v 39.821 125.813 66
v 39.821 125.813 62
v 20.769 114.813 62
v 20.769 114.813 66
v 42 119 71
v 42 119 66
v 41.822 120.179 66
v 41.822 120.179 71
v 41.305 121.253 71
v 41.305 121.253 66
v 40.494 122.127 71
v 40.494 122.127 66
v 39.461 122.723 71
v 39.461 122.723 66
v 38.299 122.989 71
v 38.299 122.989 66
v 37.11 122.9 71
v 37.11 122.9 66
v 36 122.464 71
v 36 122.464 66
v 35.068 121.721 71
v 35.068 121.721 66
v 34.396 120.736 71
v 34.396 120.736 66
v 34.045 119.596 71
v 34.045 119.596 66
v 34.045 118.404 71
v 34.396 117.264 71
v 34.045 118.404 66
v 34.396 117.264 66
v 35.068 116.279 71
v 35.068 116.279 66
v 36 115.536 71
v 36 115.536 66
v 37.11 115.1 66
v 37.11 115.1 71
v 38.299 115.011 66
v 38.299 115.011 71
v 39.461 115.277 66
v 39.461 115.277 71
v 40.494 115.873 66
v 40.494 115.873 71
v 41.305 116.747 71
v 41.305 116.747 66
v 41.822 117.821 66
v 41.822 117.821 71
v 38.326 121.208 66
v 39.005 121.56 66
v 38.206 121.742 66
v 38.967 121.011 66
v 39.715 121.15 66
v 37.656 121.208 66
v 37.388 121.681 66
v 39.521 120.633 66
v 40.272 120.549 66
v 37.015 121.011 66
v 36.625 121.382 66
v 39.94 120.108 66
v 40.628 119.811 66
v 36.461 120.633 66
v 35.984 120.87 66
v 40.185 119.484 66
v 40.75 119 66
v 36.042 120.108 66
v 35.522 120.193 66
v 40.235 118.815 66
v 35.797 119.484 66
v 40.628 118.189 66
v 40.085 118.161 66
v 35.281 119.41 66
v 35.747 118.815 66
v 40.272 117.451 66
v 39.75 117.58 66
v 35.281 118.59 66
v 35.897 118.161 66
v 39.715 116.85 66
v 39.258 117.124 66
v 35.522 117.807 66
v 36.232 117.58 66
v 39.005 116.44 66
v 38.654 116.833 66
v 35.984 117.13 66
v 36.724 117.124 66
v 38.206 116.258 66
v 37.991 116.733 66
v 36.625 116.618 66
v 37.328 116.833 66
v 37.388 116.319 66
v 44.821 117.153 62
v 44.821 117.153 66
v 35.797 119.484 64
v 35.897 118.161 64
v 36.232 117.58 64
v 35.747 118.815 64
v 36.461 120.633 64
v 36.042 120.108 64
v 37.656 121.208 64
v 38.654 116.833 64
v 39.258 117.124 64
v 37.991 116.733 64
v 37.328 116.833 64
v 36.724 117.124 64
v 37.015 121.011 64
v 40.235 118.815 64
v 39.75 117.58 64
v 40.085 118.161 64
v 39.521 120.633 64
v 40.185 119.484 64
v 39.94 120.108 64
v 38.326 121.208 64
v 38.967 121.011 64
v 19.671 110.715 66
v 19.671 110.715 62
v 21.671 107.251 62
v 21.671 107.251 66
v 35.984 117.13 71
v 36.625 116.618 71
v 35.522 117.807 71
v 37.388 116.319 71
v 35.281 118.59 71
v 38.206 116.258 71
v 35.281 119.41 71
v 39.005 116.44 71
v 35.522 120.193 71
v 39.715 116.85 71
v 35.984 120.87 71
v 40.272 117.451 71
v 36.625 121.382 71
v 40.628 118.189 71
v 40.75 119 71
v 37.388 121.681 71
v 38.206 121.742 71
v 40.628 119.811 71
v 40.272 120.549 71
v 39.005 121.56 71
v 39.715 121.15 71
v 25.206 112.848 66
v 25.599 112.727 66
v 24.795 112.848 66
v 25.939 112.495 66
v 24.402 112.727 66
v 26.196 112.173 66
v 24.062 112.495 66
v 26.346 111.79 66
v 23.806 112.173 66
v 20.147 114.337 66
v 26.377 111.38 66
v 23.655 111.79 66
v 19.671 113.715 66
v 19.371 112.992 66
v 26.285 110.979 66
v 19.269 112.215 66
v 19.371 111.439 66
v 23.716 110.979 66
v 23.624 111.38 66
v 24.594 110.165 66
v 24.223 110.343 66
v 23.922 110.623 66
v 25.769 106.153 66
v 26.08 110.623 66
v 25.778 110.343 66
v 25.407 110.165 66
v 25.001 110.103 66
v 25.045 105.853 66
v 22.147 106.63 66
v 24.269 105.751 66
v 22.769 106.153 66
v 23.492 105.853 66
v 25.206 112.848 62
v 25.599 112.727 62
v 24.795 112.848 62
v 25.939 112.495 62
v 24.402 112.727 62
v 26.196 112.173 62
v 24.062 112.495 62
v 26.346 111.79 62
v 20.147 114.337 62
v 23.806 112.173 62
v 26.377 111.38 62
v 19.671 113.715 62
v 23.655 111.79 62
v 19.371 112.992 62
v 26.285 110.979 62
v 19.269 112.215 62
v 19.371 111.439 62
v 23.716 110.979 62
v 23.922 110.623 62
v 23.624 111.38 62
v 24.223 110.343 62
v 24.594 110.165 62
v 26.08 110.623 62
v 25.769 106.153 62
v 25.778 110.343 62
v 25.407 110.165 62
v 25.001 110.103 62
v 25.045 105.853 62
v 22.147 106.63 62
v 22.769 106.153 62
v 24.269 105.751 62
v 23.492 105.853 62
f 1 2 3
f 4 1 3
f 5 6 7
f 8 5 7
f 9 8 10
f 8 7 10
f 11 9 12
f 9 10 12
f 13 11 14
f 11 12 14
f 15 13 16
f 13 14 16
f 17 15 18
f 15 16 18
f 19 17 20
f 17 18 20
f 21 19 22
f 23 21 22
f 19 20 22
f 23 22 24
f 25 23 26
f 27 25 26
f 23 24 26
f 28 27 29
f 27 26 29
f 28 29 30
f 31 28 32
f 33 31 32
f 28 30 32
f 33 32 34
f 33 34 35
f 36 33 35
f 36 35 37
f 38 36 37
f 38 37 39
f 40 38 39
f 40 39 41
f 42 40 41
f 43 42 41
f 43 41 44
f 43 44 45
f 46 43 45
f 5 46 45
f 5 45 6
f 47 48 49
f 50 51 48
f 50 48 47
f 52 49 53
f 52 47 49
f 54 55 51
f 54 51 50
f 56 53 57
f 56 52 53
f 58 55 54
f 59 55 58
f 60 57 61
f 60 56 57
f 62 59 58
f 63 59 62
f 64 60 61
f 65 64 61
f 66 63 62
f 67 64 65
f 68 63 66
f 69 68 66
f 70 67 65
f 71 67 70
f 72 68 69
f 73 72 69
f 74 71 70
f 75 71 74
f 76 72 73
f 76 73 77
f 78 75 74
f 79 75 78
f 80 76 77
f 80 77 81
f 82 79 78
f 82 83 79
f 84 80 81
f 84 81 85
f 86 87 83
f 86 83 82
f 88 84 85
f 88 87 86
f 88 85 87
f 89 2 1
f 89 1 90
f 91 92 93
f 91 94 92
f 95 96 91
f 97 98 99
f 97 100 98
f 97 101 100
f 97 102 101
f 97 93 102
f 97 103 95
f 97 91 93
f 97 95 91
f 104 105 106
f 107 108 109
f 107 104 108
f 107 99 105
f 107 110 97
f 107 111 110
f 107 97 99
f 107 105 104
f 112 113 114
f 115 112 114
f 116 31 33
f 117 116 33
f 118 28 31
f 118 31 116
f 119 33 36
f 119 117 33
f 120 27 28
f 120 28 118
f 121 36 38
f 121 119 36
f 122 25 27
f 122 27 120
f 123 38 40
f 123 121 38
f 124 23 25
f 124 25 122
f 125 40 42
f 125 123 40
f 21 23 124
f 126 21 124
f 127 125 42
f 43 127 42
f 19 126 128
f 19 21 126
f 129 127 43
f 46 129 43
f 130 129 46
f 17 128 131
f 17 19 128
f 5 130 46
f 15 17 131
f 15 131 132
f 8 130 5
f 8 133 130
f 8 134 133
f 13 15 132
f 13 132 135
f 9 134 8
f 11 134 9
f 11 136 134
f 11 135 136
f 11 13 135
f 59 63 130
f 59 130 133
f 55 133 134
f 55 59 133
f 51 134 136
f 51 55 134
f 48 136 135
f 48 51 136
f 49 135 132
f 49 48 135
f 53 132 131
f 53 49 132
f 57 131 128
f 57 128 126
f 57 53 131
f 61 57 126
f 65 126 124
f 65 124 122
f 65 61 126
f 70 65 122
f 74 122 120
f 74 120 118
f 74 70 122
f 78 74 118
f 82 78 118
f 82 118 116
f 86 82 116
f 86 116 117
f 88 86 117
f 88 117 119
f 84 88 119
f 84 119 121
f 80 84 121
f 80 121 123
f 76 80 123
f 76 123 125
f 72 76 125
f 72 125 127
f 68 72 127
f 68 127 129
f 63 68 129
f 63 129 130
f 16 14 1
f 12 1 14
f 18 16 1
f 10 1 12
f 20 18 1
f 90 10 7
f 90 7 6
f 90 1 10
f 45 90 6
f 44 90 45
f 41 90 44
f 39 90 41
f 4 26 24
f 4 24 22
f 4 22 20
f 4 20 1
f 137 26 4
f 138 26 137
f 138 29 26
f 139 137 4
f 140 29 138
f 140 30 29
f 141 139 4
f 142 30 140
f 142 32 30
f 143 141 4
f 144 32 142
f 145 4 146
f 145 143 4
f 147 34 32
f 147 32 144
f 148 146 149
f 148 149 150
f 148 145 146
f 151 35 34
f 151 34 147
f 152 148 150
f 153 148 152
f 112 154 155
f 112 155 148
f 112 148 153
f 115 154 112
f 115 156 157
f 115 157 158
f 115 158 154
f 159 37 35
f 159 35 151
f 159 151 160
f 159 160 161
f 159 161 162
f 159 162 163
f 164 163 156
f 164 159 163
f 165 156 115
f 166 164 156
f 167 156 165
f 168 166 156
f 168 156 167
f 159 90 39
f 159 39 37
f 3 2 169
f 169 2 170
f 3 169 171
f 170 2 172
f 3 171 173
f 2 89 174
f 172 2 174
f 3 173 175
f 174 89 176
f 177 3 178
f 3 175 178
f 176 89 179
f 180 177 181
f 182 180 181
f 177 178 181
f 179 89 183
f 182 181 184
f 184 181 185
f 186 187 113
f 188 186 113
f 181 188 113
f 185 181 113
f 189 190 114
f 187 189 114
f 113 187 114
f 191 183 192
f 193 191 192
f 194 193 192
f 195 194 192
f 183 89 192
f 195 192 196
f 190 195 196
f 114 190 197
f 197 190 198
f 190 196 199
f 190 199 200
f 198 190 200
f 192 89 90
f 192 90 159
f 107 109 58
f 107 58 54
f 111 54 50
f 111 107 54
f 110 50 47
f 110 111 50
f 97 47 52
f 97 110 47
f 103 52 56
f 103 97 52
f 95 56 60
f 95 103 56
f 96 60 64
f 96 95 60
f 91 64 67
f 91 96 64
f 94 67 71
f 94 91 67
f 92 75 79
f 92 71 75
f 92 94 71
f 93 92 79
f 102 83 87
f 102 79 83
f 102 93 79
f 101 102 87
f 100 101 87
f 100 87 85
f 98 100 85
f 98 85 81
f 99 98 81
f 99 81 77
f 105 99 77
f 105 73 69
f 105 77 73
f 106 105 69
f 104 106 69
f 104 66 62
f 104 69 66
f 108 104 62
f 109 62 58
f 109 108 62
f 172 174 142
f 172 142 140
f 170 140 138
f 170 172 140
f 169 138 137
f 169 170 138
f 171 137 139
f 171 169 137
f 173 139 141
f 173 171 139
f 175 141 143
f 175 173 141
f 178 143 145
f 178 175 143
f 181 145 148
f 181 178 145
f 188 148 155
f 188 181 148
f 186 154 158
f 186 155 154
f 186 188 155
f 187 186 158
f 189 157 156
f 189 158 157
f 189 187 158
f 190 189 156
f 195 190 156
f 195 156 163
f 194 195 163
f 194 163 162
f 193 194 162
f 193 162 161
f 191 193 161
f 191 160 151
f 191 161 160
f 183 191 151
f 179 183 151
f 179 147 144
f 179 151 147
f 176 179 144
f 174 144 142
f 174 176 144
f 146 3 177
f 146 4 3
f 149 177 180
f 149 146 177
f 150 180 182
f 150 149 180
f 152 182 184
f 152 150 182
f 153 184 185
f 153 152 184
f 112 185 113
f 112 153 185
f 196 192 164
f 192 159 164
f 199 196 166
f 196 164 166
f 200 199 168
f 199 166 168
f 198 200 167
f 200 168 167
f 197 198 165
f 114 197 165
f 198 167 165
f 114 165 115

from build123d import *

# Parameters (mm, degrees)
CYLINDER083_R          = 2.75
CYLINDER083_DEPTH      = 7
CYLINDER082_R          = 4
CYLINDER082_DEPTH      = 9
CYLINDER070_R          = 1.38
CYLINDER070_DEPTH      = 10
CYLINDER072_R          = 2.25
CYLINDER072_DEPTH      = 10
BOX040_W               = 25
BOX040_H               = 10
BOX040_DEPTH           = 4
CUT048_PLACEMENT_ANGLE = 30
FILLET007_R            = 3


with BuildPart() as cilindro003:
    # Cylinder083 → Cylinder083 (new body)
    with BuildSketch(Plane(origin=(17, 17, 12), x_dir=(1, 0, 0), z_dir=(0, 0, 1))):
        Circle(CYLINDER083_R)
    extrude(amount=CYLINDER083_DEPTH)


with BuildPart() as extensi_n_servo001:
    # Cylinder082 → Cylinder082 (new body)
    with BuildSketch(Plane(origin=(17, 17, 10), x_dir=(1, 0, 0), z_dir=(0, 0, 1))):
        Circle(CYLINDER082_R)
    extrude(amount=CYLINDER082_DEPTH)

    # Cut054: cut Cilindro003
    add(cilindro003.part, mode=Mode.SUBTRACT)


with BuildPart() as extensi_n_servo001_1:
    # Cut054 placement: moved
    add(extensi_n_servo001.part.moved(Location((21, 102, 52))))


with BuildPart() as cylinder070:
    # Cylinder070 → Cylinder070 (new body)
    with BuildSketch(Plane(origin=(25, 52, 59), x_dir=(1, 0, 0), z_dir=(0, 0, 1))):
        Circle(CYLINDER070_R)
    extrude(amount=CYLINDER070_DEPTH)


with BuildPart() as cylinder072:
    # Cylinder072 → Cylinder072 (new body)
    with BuildSketch(Plane(origin=(40, 52, 59), x_dir=(1, 0, 0), z_dir=(0, 0, 1))):
        Circle(CYLINDER072_R)
    extrude(amount=CYLINDER072_DEPTH)


with BuildPart() as fusion010:
    # Box040 → Box040 (new body)
    with BuildSketch(Plane(origin=(45, 57, 62), x_dir=(-1, 0, 0), z_dir=(0, 0, 1))):
        with Locations((12.5, 5)):
            Rectangle(BOX040_W, BOX040_H)
    extrude(amount=BOX040_DEPTH)

    # Cut047: cut Cylinder072
    add(cylinder072.part, mode=Mode.SUBTRACT)

    # Cut048: cut Cylinder070
    add(cylinder070.part, mode=Mode.SUBTRACT)


with BuildPart() as fusion010_1:
    # Cut048 placement: moved
    add(fusion010.part.moved(Location((31.35, -13.05, 0))).rotate(Axis((31.35, -13.05, 0), (0, 0, 1)), CUT048_PLACEMENT_ANGLE))

    # Fillet007
    fillet007_edges = [fusion010_1.edges().sort_by_distance(p)[0] for p in [
        (20.170508, 46.313448, 64),
        (25.170508, 37.653194, 64),
    ]]
    fillet(fillet007_edges, radius=FILLET007_R)


with BuildPart() as fusion010_2:
    # Fillet007 placement: moved
    add(fusion010_1.part.moved(Location((-2, 67, 0))))

    # Fusion010: union Extensión servo001
    add(extensi_n_servo001_1.part)


solid = fusion010_2.part
